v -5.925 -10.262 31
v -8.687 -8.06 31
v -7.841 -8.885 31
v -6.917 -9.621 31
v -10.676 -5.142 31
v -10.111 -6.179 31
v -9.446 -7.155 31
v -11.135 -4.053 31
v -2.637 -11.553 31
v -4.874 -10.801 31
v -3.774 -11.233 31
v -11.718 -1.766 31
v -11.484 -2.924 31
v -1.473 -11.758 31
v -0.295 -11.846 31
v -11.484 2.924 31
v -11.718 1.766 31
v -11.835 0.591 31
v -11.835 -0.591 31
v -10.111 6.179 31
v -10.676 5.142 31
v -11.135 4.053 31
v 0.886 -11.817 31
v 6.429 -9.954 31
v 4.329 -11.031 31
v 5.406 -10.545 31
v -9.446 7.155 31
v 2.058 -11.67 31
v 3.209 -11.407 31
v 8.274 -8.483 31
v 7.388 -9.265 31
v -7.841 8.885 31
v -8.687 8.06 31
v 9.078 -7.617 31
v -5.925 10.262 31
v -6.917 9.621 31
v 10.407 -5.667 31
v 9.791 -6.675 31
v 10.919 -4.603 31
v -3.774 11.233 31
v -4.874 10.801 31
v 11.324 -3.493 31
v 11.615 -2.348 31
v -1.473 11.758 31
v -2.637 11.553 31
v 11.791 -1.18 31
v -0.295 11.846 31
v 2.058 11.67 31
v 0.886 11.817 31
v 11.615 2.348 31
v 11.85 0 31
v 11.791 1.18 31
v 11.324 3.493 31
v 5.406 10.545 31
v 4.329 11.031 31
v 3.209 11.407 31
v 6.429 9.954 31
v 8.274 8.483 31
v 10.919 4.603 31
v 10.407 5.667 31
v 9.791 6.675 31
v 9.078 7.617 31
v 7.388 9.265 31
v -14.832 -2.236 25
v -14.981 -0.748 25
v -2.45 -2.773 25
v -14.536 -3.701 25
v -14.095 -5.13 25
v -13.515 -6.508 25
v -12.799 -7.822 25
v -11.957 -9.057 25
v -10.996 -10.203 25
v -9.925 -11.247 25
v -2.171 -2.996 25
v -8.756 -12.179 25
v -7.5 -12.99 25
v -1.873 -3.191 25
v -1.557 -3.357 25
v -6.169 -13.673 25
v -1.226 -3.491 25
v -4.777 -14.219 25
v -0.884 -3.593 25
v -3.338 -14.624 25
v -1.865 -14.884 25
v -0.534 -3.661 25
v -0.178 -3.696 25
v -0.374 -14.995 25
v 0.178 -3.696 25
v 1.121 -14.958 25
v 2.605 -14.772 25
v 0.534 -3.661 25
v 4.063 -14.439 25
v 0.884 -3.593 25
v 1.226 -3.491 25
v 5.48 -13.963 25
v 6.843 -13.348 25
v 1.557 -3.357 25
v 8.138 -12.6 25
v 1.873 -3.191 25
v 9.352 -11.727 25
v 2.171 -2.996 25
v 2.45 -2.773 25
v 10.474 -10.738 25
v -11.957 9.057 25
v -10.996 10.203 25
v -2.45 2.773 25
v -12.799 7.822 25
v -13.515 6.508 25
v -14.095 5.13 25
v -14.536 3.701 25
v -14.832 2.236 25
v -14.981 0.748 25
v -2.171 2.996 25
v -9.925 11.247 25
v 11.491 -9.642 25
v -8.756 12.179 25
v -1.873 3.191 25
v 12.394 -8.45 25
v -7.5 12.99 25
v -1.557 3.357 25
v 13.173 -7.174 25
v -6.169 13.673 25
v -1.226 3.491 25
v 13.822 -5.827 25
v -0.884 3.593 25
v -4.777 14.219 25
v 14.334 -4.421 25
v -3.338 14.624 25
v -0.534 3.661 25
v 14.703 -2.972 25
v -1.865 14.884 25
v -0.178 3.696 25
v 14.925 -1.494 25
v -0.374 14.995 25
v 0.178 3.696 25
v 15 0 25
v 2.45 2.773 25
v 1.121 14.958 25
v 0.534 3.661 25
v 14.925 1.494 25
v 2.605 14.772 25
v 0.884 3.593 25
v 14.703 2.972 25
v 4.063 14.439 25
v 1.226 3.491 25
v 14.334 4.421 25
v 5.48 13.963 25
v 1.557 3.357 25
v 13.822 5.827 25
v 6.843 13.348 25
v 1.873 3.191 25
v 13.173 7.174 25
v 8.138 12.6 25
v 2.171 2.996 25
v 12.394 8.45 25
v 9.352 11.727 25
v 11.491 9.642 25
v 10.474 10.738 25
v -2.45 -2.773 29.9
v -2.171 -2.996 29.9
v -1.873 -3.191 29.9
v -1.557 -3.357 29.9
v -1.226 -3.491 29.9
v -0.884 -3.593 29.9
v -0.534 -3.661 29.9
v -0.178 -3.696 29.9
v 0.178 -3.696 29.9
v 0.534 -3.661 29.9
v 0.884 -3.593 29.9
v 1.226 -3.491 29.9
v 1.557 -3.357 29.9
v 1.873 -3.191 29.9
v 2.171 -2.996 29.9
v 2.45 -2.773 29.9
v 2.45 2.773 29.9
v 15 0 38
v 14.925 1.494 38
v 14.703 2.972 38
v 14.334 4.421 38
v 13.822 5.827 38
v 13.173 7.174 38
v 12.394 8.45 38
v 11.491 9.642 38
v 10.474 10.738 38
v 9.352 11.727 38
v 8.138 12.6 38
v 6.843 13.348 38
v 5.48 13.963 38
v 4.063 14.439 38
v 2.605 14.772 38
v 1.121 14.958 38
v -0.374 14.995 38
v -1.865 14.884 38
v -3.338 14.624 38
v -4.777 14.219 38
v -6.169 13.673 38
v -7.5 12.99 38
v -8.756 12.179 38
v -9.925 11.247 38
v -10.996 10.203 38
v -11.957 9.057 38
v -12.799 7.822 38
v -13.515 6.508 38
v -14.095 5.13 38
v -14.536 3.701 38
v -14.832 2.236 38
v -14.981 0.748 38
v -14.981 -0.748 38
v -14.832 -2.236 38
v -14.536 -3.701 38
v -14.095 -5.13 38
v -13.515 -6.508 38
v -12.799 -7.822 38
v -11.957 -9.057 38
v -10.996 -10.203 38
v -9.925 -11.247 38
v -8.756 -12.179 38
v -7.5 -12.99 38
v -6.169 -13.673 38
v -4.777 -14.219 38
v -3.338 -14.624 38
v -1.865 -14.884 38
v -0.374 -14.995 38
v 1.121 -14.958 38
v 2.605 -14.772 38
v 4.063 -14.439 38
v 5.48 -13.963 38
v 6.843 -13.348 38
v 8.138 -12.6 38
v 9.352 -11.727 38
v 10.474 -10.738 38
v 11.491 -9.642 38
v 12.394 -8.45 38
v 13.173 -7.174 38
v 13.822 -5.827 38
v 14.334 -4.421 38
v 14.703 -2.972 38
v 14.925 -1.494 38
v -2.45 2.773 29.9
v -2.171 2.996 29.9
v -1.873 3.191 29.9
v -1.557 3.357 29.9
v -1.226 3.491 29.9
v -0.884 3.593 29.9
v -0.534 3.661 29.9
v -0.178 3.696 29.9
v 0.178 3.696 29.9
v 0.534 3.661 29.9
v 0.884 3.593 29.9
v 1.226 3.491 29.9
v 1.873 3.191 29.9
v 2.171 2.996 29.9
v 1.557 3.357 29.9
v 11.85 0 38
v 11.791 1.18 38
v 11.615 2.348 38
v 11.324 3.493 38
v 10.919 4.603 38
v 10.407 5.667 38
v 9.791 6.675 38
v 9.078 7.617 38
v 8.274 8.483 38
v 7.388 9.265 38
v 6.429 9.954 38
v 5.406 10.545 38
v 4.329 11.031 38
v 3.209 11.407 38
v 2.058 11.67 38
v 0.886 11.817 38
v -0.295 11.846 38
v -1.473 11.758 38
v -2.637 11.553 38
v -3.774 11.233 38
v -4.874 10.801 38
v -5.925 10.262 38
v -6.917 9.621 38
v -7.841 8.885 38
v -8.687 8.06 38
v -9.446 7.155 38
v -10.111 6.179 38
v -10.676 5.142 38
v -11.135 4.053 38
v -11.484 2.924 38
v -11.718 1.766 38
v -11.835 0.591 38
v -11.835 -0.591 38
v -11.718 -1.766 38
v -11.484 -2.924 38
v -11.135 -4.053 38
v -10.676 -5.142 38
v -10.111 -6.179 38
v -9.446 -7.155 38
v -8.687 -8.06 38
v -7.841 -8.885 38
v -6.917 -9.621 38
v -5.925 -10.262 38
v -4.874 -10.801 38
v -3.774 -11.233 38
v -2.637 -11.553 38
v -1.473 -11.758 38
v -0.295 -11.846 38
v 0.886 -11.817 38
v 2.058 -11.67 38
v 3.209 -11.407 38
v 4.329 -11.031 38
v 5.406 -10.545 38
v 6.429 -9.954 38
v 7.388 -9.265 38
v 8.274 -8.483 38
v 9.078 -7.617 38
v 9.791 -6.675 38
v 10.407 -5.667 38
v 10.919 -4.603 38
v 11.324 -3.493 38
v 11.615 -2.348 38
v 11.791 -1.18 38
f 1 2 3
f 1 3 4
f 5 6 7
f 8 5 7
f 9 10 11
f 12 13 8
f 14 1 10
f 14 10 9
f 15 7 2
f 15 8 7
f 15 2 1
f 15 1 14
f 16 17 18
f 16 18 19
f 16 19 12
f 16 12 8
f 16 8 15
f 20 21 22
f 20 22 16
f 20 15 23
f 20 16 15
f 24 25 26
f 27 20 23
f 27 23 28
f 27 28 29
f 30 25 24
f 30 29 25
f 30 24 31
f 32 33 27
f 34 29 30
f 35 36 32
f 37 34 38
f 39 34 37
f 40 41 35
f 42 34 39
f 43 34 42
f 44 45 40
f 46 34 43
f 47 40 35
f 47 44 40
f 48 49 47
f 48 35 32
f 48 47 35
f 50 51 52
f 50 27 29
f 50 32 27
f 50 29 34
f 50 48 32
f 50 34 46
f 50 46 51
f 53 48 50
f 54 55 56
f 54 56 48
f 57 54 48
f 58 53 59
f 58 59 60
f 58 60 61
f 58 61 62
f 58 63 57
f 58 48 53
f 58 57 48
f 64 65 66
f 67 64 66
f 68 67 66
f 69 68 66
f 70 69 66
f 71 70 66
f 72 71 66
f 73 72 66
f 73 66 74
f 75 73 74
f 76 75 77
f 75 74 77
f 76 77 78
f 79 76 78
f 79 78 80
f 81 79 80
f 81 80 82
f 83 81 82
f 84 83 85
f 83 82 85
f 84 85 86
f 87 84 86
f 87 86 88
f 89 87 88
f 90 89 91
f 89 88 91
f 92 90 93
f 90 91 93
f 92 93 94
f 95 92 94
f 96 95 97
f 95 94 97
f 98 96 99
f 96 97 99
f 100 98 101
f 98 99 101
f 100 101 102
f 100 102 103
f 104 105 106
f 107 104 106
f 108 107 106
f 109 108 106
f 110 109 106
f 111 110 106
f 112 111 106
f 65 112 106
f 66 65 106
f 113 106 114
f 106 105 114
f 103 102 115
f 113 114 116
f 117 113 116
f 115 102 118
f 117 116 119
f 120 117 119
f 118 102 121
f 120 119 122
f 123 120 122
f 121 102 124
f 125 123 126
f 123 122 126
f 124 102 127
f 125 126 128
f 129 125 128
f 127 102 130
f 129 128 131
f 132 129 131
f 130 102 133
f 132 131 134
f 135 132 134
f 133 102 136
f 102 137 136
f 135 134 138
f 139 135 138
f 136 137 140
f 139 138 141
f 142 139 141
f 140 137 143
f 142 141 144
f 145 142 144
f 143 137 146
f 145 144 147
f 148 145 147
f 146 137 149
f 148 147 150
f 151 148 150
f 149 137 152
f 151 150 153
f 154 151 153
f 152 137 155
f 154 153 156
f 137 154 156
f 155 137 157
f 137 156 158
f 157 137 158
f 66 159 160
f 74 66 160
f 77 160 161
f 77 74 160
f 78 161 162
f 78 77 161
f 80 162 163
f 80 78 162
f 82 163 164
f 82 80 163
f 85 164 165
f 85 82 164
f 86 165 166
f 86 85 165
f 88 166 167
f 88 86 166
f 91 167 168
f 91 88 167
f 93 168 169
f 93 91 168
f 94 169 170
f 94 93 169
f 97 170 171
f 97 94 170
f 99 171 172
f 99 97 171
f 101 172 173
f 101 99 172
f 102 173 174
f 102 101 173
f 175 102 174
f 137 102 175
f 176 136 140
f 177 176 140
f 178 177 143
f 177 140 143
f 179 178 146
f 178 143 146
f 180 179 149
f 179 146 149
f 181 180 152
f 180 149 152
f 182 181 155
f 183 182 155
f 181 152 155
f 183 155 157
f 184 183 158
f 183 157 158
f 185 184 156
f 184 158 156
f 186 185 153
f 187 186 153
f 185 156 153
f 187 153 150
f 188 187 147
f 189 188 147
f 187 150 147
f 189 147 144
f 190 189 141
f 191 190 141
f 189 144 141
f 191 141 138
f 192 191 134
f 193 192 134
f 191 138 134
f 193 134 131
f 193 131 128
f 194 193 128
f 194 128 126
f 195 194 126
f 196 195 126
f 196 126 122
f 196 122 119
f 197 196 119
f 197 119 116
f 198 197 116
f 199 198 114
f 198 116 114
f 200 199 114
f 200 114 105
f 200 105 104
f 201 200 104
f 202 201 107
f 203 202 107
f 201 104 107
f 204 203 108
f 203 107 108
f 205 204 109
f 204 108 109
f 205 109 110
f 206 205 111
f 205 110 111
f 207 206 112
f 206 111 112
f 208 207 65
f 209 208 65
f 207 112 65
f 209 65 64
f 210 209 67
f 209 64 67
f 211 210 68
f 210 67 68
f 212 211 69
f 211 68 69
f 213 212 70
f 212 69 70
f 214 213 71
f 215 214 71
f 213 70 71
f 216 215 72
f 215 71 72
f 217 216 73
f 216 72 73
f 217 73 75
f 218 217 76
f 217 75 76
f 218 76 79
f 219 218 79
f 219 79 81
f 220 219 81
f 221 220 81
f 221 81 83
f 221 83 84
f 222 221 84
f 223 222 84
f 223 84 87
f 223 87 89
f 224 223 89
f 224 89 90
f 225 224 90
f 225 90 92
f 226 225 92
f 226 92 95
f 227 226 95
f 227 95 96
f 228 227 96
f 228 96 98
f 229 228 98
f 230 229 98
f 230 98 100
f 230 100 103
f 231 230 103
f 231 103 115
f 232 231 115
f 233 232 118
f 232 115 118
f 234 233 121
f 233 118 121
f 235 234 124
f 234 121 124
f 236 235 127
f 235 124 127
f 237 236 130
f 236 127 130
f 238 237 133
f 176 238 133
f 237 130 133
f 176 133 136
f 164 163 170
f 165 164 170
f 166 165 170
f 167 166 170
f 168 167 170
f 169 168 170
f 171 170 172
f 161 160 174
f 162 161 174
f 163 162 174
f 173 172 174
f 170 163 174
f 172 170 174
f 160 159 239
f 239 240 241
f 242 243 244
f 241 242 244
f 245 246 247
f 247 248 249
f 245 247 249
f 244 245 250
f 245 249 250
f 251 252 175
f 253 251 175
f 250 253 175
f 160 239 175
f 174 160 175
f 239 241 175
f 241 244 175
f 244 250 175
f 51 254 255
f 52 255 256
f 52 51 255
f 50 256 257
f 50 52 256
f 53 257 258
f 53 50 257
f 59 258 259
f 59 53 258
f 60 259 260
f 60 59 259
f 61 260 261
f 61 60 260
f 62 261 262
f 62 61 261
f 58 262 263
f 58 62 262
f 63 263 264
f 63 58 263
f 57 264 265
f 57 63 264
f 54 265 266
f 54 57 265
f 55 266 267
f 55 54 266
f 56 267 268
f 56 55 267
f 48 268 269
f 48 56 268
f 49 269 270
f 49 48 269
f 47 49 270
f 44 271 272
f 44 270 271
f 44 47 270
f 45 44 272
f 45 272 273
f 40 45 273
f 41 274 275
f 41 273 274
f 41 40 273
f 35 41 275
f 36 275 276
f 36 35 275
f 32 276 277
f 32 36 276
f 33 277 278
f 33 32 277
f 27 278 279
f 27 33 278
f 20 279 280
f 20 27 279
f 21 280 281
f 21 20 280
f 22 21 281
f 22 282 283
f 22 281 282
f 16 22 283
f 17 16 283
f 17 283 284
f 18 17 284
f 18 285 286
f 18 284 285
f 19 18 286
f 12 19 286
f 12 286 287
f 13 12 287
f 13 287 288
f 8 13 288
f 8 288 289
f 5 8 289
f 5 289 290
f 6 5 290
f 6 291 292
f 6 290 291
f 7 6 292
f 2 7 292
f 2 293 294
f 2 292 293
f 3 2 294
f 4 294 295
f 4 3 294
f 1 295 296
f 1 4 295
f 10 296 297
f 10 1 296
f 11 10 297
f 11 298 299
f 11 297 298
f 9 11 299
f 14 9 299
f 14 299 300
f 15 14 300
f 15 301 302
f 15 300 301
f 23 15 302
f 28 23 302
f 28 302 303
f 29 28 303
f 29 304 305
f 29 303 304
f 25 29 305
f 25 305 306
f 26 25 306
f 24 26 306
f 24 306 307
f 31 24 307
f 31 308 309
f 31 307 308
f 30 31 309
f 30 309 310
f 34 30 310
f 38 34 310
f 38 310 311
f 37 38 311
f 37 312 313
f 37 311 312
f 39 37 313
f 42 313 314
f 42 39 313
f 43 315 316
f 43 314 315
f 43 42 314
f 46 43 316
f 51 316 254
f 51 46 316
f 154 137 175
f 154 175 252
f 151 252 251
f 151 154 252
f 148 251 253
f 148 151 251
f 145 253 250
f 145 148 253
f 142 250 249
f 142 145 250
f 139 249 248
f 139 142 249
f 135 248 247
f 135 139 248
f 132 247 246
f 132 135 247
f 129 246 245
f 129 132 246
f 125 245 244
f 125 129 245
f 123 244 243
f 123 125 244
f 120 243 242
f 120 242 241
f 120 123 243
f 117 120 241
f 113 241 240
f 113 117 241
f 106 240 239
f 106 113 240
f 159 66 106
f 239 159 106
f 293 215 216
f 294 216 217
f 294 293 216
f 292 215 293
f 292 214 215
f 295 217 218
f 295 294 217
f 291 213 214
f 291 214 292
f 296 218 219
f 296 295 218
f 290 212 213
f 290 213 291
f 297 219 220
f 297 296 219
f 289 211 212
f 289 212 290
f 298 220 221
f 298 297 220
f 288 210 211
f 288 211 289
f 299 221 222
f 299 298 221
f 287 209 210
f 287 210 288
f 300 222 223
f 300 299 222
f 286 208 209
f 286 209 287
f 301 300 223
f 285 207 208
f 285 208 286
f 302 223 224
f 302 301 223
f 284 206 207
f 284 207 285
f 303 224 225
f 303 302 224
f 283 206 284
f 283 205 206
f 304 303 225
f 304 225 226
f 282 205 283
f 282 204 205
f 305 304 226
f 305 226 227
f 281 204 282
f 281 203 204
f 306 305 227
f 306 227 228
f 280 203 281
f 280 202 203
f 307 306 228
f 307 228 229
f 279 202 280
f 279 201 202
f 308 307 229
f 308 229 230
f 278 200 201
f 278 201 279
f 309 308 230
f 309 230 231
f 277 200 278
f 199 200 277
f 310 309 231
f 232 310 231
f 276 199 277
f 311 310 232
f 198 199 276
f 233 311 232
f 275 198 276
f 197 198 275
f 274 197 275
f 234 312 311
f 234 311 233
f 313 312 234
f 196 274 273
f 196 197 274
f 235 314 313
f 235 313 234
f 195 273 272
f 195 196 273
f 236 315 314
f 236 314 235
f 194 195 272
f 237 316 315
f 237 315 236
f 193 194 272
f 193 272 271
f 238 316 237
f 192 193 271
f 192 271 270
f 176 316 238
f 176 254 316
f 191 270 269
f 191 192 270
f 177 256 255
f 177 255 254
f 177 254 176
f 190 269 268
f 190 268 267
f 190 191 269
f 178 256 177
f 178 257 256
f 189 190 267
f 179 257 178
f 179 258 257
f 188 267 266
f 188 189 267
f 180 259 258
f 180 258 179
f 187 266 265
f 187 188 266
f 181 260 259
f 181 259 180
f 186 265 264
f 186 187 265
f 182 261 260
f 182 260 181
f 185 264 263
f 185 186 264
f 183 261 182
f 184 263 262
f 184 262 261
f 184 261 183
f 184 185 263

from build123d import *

# Parameters (mm, degrees)
BOX005_W          = 10
BOX005_H          = 10
BOX005_DEPTH      = 40
BOX004_W          = 10
BOX004_H          = 10
BOX004_DEPTH      = 40
CYLINDER011_R     = 3.7
CYLINDER011_DEPTH = 36.1
CYLINDER013_R     = 11.85
CYLINDER013_DEPTH = 100
CYLINDER012_R     = 15
CYLINDER012_DEPTH = 13


with BuildPart() as cube005:
    # Box005 → Box005 (new body)
    with BuildSketch(Plane(origin=(-1.85, -5, 5), x_dir=(1, 0, 0), z_dir=(0, 0, 1))):
        with Locations((5, 5)):
            Rectangle(BOX005_W, BOX005_H)
    extrude(amount=BOX005_DEPTH)


with BuildPart() as cube004:
    # Box004 → Box004 (new body)
    with BuildSketch(Plane(origin=(13.05, -5, -11), x_dir=(1, 0, 0), z_dir=(0, 0, 1))):
        with Locations((5, 5)):
            Rectangle(BOX004_W, BOX004_H)
    extrude(amount=BOX004_DEPTH)


with BuildPart() as drive001:
    # Cylinder011 → Cylinder011 (new body)
    with BuildSketch(Plane(origin=(10.6, 0, -9.2), x_dir=(1, 0, 0), z_dir=(0, 0, 1))):
        Circle(CYLINDER011_R)
    extrude(amount=CYLINDER011_DEPTH)

    # Cut005: cut Cube004
    add(cube004.part, mode=Mode.SUBTRACT)

    # Cut055: cut Cube005
    add(cube005.part, mode=Mode.SUBTRACT)


with BuildPart() as drive001_1:
    # Cut055 placement: moved
    add(drive001.part.moved(Location((-10.6, 0, 3))))


with BuildPart() as cylinder006:
    # Cylinder013 → Cylinder013 (new body)
    with BuildSketch(Plane.XY.offset(31)):
        Circle(CYLINDER013_R)
    extrude(amount=CYLINDER013_DEPTH)


with BuildPart() as winder_end_motor:
    # Cylinder012 → Cylinder012 (new body)
    with BuildSketch(Plane.XY.offset(25)):
        Circle(CYLINDER012_R)
    extrude(amount=CYLINDER012_DEPTH)

    # Cut054: cut Cylinder006
    add(cylinder006.part, mode=Mode.SUBTRACT)

    # Cut056: cut drive001
    add(drive001_1.part, mode=Mode.SUBTRACT)


solid = winder_end_motor.part
